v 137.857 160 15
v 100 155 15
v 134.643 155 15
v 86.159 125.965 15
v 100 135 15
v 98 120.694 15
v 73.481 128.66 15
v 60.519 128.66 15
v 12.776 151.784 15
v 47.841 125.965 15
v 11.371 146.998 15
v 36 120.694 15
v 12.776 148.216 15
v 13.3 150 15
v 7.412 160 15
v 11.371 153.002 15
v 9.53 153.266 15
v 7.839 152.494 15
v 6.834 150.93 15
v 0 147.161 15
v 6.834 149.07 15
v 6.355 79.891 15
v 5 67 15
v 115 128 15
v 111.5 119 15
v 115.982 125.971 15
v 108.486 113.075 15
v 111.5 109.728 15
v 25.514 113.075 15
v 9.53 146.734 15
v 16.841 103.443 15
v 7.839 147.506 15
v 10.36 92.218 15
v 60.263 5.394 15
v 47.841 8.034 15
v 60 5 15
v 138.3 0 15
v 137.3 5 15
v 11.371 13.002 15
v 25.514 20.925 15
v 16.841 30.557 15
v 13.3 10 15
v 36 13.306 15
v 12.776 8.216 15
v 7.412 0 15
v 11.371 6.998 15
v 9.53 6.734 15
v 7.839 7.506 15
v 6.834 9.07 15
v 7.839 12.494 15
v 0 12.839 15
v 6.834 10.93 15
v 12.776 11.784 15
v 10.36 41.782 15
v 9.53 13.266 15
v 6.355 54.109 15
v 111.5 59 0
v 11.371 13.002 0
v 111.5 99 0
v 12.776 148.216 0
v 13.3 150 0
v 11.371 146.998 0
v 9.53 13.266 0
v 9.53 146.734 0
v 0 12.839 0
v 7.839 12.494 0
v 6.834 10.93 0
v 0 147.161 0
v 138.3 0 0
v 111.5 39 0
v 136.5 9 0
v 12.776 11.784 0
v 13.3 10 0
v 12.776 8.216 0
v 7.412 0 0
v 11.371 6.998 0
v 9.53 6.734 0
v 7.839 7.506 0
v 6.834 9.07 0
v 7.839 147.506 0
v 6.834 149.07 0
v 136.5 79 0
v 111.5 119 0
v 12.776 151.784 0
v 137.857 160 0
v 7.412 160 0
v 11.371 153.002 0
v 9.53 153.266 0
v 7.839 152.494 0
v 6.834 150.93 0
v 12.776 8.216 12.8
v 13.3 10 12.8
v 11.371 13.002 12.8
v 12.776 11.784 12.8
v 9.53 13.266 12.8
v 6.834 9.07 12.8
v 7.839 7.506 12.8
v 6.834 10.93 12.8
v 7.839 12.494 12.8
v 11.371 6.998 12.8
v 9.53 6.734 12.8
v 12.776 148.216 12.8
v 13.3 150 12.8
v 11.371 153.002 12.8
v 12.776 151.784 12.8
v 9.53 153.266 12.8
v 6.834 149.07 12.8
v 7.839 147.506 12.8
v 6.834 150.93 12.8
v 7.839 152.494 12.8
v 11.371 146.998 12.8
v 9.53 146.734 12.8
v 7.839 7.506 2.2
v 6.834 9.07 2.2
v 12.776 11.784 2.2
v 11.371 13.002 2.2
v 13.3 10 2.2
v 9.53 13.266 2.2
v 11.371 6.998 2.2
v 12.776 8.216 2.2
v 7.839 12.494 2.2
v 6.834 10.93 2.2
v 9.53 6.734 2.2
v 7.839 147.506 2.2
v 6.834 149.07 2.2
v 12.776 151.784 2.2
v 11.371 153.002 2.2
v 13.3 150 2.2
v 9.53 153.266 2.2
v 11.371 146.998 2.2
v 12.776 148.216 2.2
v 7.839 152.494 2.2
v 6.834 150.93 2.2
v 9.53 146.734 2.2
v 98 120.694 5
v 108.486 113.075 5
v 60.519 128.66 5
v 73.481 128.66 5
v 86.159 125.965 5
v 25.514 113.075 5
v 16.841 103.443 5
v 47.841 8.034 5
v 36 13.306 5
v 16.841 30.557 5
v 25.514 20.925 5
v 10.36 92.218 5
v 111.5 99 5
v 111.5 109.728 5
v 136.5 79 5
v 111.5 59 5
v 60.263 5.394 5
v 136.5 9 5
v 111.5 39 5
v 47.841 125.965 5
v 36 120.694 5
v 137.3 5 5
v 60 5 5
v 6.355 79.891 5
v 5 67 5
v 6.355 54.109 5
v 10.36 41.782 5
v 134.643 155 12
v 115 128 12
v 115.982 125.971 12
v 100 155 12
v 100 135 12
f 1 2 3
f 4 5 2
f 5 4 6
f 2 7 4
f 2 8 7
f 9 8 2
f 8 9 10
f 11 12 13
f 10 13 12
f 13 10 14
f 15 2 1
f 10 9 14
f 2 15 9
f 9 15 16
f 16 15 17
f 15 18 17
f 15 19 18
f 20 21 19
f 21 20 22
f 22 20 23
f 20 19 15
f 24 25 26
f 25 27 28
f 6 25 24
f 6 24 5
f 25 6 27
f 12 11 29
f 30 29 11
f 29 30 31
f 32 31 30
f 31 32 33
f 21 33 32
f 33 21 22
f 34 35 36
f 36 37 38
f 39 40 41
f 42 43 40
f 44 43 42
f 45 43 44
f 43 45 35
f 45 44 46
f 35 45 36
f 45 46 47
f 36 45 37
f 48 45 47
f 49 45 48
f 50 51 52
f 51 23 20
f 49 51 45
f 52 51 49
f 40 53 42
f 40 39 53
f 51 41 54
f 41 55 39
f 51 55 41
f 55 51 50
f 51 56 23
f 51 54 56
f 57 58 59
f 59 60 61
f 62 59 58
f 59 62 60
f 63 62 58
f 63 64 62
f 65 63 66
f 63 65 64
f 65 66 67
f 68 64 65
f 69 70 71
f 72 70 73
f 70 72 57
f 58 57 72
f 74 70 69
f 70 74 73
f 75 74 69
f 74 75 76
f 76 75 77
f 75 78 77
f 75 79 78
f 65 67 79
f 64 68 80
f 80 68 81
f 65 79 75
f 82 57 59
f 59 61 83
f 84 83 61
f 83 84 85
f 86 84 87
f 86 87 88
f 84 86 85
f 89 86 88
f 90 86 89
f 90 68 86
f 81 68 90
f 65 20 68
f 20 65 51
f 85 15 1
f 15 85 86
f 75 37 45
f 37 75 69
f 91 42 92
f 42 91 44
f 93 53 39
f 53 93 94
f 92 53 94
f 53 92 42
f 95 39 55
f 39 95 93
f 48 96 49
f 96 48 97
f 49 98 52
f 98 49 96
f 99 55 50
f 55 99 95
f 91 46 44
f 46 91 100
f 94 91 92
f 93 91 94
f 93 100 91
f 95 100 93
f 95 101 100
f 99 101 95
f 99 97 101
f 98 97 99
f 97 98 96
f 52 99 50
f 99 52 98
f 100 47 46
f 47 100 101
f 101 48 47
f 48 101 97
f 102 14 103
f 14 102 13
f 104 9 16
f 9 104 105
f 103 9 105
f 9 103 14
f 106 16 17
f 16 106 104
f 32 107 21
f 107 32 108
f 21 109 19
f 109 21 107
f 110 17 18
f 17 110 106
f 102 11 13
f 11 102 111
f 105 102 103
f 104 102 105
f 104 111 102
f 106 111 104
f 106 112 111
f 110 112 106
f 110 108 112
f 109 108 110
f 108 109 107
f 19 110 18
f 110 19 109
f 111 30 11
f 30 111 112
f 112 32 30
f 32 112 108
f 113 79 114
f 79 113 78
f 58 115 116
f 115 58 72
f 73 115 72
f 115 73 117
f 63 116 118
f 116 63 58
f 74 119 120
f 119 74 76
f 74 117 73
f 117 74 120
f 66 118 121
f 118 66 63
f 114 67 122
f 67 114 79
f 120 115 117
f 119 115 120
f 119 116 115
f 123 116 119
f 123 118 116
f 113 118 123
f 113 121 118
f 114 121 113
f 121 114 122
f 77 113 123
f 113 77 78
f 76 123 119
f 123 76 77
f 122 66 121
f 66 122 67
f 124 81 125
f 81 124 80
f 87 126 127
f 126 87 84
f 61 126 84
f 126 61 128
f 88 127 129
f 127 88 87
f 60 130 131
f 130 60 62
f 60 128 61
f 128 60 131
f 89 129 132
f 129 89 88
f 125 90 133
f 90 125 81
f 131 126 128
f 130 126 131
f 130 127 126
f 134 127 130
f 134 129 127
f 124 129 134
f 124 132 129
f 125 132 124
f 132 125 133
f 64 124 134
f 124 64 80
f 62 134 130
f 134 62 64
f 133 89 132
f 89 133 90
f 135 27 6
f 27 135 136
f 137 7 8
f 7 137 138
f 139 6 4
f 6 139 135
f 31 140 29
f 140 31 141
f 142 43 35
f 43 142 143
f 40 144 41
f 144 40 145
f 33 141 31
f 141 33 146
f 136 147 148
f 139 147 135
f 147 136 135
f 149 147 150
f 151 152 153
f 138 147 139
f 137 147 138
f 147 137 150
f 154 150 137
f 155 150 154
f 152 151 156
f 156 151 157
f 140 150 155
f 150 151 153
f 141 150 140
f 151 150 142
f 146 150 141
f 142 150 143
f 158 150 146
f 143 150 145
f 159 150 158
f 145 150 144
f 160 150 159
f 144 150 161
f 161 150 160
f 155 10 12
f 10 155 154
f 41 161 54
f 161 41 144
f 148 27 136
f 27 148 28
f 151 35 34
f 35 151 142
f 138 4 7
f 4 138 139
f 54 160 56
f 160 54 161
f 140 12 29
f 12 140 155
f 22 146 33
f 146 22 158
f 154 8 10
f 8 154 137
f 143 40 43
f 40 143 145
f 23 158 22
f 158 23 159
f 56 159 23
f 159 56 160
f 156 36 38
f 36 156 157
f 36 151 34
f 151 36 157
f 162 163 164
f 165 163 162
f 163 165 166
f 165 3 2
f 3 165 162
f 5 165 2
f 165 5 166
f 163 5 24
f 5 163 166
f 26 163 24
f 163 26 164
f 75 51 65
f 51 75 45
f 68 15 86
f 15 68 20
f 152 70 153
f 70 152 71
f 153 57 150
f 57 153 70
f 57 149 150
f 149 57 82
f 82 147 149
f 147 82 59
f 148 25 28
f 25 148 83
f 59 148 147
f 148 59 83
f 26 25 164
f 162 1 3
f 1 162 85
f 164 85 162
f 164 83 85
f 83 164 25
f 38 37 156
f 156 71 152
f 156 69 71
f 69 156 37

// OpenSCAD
width = 275 ;
length = 160;
height= 15;
magnet_radius=3.3;
magnet_height=2.2;
spacing=10;
base_thickness=5;

//difference() {
intersection() {

intersection() {
    difference() {
        // base plate
        cube([width, length,height]);
        
        // top magnet holes
        translate([spacing,spacing,height-magnet_height]) cylinder(r=magnet_radius, h=magnet_height+1);
        translate([width - spacing,spacing,height-magnet_height]) cylinder(r=magnet_radius, h=magnet_height+1);
        translate([spacing, length - spacing, height-magnet_height]) cylinder(r=magnet_radius, h=magnet_height+1);
        translate([width - spacing, length - spacing,height-magnet_height]) cylinder(r=magnet_radius, h=magnet_height+1);
        
        // bottom magnet holes
        translate([spacing,spacing,-1]) cylinder(r=magnet_radius, h=magnet_height+1);
        translate([width - spacing,spacing,-1]) cylinder(r=magnet_radius, h=magnet_height+1);
        translate([spacing, length - spacing, -1]) cylinder(r=magnet_radius, h=magnet_height+1);
        translate([width - spacing, length - spacing,-1]) cylinder(r=magnet_radius, h=magnet_height+1);
        
        // templates
//       intersection() {
 //               rotate([0,90,0])translate([-height/2,length/2,5]) cylinder(r1=66, r2=20, h=265);
//                %translate([0,0,base_thickness]) cube([width, length,height-1]);
 //       }
        // impact templates
       // round template     
       translate([67,67,base_thickness])cylinder(r=62, h=height);
       // teardrops
       translate([0,0,base_thickness])linear_extrude(height=height - base_thickness+1) {
           polygon(points=[ [ 60,5], [width-15, 5], [width-15,20], [120,95]]);
       }
       // movement template
       translate([0,0,height-3])linear_extrude(height=height - base_thickness+1) {
           polygon(points=[ [ 100,155], [width-15,155], [195,65], [130,97],[115,128],[100,135]]);
       }
    }
    
        // "round" corners
        translate([width/2,length/2,-1])cylinder(r=width/2+16, h=height*2);

    }
            // cut into two pieces to fit my printbed
   color([0,1,0]) 
           translate([-1,-1,-1])
           linear_extrude(height=height + 5) {
              polygon(points=[[0,0],[0,length+2],[width/2+2, length+2],[width/2-25, length-40],[width/2-25, length-60],[width/2, length-80],[width/2-25, length-100],[width/2-25, length-120],[width/2, length-150],[width/2 +2,0]]);
    }


}
